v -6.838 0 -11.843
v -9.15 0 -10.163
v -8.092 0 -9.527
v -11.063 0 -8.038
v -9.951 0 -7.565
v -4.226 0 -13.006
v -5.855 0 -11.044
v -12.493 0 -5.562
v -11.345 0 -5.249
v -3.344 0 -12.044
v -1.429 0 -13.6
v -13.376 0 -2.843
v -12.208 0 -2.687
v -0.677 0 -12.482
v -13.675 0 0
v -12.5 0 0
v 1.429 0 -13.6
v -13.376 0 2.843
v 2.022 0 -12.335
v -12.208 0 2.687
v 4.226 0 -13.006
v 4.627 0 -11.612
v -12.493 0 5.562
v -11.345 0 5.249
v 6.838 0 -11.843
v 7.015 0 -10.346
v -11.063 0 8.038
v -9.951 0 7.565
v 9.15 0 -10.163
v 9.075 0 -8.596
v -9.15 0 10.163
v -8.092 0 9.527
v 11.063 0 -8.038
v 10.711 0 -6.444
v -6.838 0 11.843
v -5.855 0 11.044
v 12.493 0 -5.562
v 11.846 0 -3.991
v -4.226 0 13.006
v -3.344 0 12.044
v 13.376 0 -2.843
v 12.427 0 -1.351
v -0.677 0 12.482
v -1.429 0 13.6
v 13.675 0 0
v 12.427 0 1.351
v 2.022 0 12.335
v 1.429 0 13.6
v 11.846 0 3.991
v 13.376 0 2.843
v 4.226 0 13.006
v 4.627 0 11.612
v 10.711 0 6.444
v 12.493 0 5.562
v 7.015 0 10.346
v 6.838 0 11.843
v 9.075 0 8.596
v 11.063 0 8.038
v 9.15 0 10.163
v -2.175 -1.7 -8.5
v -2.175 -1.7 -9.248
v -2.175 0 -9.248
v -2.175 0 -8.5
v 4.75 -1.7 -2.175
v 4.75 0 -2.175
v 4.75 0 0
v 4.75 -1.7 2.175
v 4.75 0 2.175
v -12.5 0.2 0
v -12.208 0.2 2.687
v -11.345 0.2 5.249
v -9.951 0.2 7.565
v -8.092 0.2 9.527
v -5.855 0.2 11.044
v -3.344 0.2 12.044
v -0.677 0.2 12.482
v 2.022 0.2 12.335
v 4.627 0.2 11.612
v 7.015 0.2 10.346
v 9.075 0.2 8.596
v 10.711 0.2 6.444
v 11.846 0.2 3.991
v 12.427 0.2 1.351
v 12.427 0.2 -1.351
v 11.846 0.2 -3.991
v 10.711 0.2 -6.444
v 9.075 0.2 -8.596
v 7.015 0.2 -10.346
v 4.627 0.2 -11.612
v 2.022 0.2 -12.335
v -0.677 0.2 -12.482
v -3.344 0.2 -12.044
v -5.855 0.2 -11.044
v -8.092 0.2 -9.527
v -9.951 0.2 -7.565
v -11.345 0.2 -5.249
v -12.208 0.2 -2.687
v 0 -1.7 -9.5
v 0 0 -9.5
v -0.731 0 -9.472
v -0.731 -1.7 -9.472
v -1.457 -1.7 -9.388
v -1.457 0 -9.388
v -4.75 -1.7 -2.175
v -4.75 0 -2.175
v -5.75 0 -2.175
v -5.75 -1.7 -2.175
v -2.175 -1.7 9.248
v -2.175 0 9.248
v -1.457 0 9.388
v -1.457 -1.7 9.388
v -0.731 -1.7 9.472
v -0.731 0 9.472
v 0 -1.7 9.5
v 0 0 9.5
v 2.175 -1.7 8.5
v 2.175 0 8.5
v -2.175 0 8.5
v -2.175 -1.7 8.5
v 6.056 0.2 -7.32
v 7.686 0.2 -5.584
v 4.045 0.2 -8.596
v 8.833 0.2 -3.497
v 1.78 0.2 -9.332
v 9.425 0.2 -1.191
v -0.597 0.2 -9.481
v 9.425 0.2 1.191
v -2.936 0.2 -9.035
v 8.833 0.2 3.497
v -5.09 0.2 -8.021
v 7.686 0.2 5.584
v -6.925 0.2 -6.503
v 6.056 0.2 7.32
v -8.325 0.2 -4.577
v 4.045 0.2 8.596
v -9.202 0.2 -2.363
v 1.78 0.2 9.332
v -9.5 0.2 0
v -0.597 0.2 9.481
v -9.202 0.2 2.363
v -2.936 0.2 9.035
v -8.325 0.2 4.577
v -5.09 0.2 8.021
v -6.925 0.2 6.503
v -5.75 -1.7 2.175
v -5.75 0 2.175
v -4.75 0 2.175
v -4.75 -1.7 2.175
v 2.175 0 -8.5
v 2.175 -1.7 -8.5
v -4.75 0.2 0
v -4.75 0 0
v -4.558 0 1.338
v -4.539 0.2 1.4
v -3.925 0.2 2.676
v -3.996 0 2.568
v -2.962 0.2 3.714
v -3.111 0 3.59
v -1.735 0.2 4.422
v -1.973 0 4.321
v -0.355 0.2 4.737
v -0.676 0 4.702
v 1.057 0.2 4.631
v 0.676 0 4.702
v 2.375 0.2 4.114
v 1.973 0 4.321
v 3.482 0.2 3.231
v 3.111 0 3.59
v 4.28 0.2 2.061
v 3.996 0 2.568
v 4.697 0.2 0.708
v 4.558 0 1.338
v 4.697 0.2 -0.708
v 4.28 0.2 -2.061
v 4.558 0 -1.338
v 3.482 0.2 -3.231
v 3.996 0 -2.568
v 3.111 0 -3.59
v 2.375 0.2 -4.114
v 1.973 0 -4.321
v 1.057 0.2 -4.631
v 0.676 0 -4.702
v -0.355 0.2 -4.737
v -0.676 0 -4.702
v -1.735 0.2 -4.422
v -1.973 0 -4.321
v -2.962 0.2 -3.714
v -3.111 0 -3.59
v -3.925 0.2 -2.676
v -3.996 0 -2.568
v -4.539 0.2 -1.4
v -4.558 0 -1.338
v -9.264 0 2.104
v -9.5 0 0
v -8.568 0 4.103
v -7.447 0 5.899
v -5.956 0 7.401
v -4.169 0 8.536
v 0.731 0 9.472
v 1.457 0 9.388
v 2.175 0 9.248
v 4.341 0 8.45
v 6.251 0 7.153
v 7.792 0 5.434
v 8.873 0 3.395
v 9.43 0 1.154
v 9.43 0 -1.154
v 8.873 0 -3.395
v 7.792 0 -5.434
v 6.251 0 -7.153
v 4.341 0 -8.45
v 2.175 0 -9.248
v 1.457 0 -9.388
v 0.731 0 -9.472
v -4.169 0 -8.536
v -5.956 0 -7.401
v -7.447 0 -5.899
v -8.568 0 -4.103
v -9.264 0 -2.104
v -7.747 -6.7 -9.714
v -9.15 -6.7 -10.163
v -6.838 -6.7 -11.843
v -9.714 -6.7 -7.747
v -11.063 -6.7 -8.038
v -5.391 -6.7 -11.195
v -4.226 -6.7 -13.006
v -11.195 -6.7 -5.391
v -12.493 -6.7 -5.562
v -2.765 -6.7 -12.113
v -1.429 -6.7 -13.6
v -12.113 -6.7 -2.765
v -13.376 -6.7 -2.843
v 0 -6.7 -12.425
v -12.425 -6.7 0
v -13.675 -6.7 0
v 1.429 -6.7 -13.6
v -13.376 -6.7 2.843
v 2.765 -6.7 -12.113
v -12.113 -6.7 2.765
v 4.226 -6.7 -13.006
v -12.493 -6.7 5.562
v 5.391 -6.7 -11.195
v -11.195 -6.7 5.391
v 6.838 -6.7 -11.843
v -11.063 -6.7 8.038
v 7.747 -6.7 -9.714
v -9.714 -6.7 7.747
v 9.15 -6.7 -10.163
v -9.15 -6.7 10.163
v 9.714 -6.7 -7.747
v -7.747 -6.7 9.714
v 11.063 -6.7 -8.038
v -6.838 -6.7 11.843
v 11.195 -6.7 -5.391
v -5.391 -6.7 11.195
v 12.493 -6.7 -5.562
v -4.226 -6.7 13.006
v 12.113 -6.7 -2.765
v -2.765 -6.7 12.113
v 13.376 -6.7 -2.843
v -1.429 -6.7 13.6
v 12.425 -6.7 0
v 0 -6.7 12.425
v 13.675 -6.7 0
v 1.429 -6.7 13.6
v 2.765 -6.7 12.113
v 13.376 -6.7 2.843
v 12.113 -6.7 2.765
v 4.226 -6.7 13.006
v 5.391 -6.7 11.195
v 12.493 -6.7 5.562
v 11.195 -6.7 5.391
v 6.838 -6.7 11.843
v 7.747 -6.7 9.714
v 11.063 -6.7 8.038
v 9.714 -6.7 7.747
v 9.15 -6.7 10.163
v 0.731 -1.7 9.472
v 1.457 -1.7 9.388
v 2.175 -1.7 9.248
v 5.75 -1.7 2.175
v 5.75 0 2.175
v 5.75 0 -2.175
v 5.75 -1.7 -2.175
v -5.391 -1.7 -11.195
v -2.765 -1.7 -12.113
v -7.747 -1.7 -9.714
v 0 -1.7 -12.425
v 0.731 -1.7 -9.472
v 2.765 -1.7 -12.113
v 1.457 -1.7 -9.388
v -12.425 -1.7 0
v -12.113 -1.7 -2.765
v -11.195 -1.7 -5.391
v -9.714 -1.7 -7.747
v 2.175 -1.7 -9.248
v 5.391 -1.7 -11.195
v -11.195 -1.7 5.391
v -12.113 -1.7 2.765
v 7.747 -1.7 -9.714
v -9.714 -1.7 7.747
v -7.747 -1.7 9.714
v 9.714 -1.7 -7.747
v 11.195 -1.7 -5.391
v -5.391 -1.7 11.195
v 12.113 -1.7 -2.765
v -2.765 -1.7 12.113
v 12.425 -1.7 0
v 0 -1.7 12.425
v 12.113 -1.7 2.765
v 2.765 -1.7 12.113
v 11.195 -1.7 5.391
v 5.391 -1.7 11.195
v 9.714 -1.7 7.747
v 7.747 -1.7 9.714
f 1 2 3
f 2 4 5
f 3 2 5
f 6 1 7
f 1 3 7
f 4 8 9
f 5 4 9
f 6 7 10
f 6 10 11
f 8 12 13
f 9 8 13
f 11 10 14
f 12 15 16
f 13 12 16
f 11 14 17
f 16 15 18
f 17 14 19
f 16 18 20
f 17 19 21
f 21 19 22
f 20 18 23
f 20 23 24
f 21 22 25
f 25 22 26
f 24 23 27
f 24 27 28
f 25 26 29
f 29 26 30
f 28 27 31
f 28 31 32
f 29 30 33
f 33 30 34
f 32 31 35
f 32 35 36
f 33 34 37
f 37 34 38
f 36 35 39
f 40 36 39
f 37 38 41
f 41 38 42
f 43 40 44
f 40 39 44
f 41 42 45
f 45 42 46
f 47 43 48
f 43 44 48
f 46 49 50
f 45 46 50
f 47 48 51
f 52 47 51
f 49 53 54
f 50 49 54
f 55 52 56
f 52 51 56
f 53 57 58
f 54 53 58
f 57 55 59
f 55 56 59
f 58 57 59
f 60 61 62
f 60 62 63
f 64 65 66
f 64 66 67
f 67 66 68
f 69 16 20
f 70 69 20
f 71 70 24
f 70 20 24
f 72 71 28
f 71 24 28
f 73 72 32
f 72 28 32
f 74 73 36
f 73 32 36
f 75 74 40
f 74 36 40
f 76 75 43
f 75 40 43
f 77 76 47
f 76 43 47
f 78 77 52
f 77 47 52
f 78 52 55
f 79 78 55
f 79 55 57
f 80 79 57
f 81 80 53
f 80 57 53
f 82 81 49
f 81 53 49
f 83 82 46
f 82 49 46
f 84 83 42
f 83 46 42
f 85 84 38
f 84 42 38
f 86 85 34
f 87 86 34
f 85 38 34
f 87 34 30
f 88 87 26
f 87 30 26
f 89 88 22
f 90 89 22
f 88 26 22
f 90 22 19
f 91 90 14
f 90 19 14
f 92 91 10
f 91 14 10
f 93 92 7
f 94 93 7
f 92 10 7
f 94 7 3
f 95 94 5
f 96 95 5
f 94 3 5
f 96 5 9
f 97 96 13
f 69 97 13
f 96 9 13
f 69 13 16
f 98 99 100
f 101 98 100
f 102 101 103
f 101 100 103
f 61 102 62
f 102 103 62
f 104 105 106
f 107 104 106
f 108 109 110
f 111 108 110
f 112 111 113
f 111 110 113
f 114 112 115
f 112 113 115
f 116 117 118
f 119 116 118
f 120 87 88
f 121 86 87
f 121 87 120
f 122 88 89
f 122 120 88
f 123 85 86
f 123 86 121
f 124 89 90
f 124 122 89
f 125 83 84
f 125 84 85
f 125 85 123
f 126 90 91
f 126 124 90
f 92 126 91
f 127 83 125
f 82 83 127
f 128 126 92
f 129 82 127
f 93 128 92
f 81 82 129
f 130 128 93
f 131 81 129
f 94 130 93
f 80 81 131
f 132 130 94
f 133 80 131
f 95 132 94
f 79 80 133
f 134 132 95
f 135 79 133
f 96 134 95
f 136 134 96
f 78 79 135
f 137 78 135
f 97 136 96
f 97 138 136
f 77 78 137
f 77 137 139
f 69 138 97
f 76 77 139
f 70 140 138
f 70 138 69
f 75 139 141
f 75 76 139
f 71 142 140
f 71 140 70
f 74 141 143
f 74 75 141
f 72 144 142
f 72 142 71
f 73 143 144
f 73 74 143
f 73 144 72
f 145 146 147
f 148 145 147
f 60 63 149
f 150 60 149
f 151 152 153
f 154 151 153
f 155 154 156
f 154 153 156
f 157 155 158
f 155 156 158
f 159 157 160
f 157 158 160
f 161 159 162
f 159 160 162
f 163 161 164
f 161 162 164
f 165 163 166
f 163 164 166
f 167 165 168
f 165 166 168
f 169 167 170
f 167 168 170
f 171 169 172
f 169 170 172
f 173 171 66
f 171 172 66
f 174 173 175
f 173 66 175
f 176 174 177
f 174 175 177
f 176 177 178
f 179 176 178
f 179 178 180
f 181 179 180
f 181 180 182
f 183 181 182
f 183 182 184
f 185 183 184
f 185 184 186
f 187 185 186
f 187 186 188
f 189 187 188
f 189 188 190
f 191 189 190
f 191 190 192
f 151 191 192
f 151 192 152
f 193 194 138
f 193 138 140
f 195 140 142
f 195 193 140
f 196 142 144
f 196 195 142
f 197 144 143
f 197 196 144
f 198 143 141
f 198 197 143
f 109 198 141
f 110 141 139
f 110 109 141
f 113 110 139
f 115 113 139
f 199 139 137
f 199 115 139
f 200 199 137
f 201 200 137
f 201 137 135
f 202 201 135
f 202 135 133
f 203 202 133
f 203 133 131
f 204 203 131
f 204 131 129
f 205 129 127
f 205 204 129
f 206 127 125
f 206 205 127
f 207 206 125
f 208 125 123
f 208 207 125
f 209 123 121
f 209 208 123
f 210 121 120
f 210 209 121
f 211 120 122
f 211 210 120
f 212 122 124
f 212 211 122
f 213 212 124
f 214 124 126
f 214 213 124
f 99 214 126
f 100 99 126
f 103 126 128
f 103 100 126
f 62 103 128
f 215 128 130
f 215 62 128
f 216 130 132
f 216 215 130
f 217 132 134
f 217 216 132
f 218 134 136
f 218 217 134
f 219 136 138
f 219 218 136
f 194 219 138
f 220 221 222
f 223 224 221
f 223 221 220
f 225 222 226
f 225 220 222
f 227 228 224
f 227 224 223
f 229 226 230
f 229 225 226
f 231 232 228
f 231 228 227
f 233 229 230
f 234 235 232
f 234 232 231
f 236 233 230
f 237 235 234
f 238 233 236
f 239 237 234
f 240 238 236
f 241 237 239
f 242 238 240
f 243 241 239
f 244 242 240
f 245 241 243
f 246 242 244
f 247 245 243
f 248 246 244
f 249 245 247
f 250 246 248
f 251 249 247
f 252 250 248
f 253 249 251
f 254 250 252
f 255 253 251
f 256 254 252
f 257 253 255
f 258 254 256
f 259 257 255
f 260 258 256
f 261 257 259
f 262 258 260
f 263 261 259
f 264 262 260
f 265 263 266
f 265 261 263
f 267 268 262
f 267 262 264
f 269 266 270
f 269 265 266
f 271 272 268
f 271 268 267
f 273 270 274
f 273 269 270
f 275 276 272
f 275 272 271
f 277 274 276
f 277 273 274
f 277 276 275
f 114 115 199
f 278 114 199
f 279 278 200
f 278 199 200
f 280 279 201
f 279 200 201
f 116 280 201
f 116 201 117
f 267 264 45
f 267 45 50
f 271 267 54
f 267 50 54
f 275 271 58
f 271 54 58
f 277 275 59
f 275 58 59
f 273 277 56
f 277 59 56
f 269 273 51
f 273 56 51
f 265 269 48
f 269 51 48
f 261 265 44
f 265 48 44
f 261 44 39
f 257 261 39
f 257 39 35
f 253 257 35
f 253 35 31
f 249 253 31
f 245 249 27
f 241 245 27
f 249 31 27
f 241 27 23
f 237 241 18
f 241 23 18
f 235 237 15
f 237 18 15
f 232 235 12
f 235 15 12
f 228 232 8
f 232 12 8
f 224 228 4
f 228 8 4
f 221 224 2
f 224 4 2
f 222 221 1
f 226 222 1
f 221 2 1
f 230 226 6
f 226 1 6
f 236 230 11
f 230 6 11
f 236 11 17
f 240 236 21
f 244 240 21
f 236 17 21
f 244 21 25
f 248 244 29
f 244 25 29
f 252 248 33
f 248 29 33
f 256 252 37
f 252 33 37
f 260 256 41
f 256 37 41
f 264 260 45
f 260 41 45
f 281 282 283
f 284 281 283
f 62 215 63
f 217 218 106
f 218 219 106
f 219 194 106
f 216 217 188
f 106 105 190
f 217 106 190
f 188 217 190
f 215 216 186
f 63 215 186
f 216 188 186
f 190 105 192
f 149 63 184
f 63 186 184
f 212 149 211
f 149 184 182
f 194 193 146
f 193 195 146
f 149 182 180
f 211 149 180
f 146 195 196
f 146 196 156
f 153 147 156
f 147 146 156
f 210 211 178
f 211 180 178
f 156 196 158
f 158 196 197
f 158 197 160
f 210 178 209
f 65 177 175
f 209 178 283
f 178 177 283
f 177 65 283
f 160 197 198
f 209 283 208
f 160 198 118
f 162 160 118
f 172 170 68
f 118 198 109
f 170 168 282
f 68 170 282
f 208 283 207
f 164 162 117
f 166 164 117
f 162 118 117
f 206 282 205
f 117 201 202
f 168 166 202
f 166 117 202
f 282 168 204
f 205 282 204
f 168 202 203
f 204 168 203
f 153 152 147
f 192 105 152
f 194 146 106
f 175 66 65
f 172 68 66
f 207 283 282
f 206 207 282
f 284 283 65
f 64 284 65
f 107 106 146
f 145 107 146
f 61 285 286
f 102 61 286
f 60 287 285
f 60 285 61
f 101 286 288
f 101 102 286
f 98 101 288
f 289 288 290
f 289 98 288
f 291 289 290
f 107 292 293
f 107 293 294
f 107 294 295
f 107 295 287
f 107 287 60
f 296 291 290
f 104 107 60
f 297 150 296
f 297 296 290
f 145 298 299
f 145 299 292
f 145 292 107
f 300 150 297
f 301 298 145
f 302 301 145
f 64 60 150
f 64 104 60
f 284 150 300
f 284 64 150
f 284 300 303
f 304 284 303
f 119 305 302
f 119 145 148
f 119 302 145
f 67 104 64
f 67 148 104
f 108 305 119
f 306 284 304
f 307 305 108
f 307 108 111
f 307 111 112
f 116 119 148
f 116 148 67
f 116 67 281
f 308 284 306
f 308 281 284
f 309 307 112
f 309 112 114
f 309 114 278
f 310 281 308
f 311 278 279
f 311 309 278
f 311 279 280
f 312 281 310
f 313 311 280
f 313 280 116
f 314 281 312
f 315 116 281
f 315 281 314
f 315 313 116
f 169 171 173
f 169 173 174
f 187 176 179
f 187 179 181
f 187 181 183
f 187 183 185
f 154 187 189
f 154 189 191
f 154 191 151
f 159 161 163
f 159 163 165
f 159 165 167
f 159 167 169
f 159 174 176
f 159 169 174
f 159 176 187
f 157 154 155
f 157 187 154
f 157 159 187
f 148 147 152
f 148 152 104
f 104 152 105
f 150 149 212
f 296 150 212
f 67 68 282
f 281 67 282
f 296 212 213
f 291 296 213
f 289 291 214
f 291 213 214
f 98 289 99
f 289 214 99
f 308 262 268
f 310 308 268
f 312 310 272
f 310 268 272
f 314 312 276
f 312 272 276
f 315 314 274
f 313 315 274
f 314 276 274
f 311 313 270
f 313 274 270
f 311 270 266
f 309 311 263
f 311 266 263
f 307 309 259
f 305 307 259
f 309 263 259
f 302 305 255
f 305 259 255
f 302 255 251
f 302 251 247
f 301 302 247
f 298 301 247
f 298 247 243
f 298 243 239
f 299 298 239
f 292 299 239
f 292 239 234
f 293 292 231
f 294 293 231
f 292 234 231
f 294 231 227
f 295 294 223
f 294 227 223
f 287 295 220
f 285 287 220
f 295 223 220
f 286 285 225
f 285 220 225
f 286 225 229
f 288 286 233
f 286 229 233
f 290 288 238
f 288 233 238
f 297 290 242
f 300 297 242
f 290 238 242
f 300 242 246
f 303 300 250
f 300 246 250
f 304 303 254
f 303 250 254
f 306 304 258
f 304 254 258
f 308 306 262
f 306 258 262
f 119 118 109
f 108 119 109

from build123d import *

# Parameters (mm, degrees)
F0_R      = 13.675
F1_DEPTH  = 6.7
F2_R      = 12.425
F3_DEPTH  = 5
F4_R      = 4.75
F5_DEPTH  = 0.2
F4_R_2    = 12.5
F4_R_3    = 9.5
F6_DEPTH  = 0.2
F8_DEPTH  = 6.701
F10_DEPTH = 6.701


with BuildPart() as f1:
    # F0 (on Front) → F1 (new body)
    with BuildSketch(Plane.XZ):
        Circle(F0_R)
    extrude(amount=F1_DEPTH)

    # F2 (on face) → F3 (cut)
    with BuildSketch(Plane.XZ.offset(6.7)):
        Circle(F2_R)
    extrude(amount=-F3_DEPTH, mode=Mode.SUBTRACT)

    # F4 (on face) → F5 (join)
    with BuildSketch(Plane(origin=(0, 0, 0), x_dir=(-1, 0, 0), z_dir=(0, 1, 0))):
        Circle(F4_R)
    extrude(amount=F5_DEPTH)

    # F4 (on face) → F6 (join)
    with BuildSketch(Plane(origin=(0, 0, 0), x_dir=(-1, 0, 0), z_dir=(0, 1, 0))):
        Circle(F4_R_2)
        Circle(F4_R_3, mode=Mode.SUBTRACT)
    extrude(amount=F6_DEPTH)

    # F7 (on face) → F8 (cut, through all)
    with BuildSketch(Plane(origin=(0, 0, 0), x_dir=(-1, 0, 0), z_dir=(0, 1, 0))):
        Polygon((-4.75, -2.175), (-4.75, 0), (-4.75, 2.175), (-5.75, 2.175), (-5.75, -2.175), align=None)
        Polygon((5.75, 2.175), (4.75, 2.175), (4.75, 0), (4.75, -2.175), (5.75, -2.175), align=None)
    extrude(amount=-F8_DEPTH, mode=Mode.SUBTRACT)

    # F9 (on face) → F10 (cut, through all)
    with BuildSketch(Plane(origin=(0, 0, 0), x_dir=(-1, 0, 0), z_dir=(0, 1, 0))):
        with BuildLine():
            Line((-2.175, -8.5), (-2.175, -9.2476686251))
            ThreePointArc((-2.175, -9.2476686251), (-1.0947940586, -9.4367063094), (0, -9.5))
            ThreePointArc((0, -9.5), (1.0947940586, -9.4367063094), (2.175, -9.2476686251))
            Line((2.175, -9.2476686251), (2.175, -8.5))
            Line((2.175, -8.5), (-2.175, -8.5))
        make_face()
        with BuildLine():
            ThreePointArc((2.175, 9.2476686251), (1.0947940586, 9.4367063094), (0, 9.5))
            ThreePointArc((0, 9.5), (-1.0947940586, 9.4367063094), (-2.175, 9.2476686251))
            Line((-2.175, 9.2476686251), (-2.175, 8.5))
            Line((-2.175, 8.5), (2.175, 8.5))
            Line((2.175, 8.5), (2.175, 9.2476686251))
        make_face()
    extrude(amount=-F10_DEPTH, mode=Mode.SUBTRACT)


solid = f1.part
